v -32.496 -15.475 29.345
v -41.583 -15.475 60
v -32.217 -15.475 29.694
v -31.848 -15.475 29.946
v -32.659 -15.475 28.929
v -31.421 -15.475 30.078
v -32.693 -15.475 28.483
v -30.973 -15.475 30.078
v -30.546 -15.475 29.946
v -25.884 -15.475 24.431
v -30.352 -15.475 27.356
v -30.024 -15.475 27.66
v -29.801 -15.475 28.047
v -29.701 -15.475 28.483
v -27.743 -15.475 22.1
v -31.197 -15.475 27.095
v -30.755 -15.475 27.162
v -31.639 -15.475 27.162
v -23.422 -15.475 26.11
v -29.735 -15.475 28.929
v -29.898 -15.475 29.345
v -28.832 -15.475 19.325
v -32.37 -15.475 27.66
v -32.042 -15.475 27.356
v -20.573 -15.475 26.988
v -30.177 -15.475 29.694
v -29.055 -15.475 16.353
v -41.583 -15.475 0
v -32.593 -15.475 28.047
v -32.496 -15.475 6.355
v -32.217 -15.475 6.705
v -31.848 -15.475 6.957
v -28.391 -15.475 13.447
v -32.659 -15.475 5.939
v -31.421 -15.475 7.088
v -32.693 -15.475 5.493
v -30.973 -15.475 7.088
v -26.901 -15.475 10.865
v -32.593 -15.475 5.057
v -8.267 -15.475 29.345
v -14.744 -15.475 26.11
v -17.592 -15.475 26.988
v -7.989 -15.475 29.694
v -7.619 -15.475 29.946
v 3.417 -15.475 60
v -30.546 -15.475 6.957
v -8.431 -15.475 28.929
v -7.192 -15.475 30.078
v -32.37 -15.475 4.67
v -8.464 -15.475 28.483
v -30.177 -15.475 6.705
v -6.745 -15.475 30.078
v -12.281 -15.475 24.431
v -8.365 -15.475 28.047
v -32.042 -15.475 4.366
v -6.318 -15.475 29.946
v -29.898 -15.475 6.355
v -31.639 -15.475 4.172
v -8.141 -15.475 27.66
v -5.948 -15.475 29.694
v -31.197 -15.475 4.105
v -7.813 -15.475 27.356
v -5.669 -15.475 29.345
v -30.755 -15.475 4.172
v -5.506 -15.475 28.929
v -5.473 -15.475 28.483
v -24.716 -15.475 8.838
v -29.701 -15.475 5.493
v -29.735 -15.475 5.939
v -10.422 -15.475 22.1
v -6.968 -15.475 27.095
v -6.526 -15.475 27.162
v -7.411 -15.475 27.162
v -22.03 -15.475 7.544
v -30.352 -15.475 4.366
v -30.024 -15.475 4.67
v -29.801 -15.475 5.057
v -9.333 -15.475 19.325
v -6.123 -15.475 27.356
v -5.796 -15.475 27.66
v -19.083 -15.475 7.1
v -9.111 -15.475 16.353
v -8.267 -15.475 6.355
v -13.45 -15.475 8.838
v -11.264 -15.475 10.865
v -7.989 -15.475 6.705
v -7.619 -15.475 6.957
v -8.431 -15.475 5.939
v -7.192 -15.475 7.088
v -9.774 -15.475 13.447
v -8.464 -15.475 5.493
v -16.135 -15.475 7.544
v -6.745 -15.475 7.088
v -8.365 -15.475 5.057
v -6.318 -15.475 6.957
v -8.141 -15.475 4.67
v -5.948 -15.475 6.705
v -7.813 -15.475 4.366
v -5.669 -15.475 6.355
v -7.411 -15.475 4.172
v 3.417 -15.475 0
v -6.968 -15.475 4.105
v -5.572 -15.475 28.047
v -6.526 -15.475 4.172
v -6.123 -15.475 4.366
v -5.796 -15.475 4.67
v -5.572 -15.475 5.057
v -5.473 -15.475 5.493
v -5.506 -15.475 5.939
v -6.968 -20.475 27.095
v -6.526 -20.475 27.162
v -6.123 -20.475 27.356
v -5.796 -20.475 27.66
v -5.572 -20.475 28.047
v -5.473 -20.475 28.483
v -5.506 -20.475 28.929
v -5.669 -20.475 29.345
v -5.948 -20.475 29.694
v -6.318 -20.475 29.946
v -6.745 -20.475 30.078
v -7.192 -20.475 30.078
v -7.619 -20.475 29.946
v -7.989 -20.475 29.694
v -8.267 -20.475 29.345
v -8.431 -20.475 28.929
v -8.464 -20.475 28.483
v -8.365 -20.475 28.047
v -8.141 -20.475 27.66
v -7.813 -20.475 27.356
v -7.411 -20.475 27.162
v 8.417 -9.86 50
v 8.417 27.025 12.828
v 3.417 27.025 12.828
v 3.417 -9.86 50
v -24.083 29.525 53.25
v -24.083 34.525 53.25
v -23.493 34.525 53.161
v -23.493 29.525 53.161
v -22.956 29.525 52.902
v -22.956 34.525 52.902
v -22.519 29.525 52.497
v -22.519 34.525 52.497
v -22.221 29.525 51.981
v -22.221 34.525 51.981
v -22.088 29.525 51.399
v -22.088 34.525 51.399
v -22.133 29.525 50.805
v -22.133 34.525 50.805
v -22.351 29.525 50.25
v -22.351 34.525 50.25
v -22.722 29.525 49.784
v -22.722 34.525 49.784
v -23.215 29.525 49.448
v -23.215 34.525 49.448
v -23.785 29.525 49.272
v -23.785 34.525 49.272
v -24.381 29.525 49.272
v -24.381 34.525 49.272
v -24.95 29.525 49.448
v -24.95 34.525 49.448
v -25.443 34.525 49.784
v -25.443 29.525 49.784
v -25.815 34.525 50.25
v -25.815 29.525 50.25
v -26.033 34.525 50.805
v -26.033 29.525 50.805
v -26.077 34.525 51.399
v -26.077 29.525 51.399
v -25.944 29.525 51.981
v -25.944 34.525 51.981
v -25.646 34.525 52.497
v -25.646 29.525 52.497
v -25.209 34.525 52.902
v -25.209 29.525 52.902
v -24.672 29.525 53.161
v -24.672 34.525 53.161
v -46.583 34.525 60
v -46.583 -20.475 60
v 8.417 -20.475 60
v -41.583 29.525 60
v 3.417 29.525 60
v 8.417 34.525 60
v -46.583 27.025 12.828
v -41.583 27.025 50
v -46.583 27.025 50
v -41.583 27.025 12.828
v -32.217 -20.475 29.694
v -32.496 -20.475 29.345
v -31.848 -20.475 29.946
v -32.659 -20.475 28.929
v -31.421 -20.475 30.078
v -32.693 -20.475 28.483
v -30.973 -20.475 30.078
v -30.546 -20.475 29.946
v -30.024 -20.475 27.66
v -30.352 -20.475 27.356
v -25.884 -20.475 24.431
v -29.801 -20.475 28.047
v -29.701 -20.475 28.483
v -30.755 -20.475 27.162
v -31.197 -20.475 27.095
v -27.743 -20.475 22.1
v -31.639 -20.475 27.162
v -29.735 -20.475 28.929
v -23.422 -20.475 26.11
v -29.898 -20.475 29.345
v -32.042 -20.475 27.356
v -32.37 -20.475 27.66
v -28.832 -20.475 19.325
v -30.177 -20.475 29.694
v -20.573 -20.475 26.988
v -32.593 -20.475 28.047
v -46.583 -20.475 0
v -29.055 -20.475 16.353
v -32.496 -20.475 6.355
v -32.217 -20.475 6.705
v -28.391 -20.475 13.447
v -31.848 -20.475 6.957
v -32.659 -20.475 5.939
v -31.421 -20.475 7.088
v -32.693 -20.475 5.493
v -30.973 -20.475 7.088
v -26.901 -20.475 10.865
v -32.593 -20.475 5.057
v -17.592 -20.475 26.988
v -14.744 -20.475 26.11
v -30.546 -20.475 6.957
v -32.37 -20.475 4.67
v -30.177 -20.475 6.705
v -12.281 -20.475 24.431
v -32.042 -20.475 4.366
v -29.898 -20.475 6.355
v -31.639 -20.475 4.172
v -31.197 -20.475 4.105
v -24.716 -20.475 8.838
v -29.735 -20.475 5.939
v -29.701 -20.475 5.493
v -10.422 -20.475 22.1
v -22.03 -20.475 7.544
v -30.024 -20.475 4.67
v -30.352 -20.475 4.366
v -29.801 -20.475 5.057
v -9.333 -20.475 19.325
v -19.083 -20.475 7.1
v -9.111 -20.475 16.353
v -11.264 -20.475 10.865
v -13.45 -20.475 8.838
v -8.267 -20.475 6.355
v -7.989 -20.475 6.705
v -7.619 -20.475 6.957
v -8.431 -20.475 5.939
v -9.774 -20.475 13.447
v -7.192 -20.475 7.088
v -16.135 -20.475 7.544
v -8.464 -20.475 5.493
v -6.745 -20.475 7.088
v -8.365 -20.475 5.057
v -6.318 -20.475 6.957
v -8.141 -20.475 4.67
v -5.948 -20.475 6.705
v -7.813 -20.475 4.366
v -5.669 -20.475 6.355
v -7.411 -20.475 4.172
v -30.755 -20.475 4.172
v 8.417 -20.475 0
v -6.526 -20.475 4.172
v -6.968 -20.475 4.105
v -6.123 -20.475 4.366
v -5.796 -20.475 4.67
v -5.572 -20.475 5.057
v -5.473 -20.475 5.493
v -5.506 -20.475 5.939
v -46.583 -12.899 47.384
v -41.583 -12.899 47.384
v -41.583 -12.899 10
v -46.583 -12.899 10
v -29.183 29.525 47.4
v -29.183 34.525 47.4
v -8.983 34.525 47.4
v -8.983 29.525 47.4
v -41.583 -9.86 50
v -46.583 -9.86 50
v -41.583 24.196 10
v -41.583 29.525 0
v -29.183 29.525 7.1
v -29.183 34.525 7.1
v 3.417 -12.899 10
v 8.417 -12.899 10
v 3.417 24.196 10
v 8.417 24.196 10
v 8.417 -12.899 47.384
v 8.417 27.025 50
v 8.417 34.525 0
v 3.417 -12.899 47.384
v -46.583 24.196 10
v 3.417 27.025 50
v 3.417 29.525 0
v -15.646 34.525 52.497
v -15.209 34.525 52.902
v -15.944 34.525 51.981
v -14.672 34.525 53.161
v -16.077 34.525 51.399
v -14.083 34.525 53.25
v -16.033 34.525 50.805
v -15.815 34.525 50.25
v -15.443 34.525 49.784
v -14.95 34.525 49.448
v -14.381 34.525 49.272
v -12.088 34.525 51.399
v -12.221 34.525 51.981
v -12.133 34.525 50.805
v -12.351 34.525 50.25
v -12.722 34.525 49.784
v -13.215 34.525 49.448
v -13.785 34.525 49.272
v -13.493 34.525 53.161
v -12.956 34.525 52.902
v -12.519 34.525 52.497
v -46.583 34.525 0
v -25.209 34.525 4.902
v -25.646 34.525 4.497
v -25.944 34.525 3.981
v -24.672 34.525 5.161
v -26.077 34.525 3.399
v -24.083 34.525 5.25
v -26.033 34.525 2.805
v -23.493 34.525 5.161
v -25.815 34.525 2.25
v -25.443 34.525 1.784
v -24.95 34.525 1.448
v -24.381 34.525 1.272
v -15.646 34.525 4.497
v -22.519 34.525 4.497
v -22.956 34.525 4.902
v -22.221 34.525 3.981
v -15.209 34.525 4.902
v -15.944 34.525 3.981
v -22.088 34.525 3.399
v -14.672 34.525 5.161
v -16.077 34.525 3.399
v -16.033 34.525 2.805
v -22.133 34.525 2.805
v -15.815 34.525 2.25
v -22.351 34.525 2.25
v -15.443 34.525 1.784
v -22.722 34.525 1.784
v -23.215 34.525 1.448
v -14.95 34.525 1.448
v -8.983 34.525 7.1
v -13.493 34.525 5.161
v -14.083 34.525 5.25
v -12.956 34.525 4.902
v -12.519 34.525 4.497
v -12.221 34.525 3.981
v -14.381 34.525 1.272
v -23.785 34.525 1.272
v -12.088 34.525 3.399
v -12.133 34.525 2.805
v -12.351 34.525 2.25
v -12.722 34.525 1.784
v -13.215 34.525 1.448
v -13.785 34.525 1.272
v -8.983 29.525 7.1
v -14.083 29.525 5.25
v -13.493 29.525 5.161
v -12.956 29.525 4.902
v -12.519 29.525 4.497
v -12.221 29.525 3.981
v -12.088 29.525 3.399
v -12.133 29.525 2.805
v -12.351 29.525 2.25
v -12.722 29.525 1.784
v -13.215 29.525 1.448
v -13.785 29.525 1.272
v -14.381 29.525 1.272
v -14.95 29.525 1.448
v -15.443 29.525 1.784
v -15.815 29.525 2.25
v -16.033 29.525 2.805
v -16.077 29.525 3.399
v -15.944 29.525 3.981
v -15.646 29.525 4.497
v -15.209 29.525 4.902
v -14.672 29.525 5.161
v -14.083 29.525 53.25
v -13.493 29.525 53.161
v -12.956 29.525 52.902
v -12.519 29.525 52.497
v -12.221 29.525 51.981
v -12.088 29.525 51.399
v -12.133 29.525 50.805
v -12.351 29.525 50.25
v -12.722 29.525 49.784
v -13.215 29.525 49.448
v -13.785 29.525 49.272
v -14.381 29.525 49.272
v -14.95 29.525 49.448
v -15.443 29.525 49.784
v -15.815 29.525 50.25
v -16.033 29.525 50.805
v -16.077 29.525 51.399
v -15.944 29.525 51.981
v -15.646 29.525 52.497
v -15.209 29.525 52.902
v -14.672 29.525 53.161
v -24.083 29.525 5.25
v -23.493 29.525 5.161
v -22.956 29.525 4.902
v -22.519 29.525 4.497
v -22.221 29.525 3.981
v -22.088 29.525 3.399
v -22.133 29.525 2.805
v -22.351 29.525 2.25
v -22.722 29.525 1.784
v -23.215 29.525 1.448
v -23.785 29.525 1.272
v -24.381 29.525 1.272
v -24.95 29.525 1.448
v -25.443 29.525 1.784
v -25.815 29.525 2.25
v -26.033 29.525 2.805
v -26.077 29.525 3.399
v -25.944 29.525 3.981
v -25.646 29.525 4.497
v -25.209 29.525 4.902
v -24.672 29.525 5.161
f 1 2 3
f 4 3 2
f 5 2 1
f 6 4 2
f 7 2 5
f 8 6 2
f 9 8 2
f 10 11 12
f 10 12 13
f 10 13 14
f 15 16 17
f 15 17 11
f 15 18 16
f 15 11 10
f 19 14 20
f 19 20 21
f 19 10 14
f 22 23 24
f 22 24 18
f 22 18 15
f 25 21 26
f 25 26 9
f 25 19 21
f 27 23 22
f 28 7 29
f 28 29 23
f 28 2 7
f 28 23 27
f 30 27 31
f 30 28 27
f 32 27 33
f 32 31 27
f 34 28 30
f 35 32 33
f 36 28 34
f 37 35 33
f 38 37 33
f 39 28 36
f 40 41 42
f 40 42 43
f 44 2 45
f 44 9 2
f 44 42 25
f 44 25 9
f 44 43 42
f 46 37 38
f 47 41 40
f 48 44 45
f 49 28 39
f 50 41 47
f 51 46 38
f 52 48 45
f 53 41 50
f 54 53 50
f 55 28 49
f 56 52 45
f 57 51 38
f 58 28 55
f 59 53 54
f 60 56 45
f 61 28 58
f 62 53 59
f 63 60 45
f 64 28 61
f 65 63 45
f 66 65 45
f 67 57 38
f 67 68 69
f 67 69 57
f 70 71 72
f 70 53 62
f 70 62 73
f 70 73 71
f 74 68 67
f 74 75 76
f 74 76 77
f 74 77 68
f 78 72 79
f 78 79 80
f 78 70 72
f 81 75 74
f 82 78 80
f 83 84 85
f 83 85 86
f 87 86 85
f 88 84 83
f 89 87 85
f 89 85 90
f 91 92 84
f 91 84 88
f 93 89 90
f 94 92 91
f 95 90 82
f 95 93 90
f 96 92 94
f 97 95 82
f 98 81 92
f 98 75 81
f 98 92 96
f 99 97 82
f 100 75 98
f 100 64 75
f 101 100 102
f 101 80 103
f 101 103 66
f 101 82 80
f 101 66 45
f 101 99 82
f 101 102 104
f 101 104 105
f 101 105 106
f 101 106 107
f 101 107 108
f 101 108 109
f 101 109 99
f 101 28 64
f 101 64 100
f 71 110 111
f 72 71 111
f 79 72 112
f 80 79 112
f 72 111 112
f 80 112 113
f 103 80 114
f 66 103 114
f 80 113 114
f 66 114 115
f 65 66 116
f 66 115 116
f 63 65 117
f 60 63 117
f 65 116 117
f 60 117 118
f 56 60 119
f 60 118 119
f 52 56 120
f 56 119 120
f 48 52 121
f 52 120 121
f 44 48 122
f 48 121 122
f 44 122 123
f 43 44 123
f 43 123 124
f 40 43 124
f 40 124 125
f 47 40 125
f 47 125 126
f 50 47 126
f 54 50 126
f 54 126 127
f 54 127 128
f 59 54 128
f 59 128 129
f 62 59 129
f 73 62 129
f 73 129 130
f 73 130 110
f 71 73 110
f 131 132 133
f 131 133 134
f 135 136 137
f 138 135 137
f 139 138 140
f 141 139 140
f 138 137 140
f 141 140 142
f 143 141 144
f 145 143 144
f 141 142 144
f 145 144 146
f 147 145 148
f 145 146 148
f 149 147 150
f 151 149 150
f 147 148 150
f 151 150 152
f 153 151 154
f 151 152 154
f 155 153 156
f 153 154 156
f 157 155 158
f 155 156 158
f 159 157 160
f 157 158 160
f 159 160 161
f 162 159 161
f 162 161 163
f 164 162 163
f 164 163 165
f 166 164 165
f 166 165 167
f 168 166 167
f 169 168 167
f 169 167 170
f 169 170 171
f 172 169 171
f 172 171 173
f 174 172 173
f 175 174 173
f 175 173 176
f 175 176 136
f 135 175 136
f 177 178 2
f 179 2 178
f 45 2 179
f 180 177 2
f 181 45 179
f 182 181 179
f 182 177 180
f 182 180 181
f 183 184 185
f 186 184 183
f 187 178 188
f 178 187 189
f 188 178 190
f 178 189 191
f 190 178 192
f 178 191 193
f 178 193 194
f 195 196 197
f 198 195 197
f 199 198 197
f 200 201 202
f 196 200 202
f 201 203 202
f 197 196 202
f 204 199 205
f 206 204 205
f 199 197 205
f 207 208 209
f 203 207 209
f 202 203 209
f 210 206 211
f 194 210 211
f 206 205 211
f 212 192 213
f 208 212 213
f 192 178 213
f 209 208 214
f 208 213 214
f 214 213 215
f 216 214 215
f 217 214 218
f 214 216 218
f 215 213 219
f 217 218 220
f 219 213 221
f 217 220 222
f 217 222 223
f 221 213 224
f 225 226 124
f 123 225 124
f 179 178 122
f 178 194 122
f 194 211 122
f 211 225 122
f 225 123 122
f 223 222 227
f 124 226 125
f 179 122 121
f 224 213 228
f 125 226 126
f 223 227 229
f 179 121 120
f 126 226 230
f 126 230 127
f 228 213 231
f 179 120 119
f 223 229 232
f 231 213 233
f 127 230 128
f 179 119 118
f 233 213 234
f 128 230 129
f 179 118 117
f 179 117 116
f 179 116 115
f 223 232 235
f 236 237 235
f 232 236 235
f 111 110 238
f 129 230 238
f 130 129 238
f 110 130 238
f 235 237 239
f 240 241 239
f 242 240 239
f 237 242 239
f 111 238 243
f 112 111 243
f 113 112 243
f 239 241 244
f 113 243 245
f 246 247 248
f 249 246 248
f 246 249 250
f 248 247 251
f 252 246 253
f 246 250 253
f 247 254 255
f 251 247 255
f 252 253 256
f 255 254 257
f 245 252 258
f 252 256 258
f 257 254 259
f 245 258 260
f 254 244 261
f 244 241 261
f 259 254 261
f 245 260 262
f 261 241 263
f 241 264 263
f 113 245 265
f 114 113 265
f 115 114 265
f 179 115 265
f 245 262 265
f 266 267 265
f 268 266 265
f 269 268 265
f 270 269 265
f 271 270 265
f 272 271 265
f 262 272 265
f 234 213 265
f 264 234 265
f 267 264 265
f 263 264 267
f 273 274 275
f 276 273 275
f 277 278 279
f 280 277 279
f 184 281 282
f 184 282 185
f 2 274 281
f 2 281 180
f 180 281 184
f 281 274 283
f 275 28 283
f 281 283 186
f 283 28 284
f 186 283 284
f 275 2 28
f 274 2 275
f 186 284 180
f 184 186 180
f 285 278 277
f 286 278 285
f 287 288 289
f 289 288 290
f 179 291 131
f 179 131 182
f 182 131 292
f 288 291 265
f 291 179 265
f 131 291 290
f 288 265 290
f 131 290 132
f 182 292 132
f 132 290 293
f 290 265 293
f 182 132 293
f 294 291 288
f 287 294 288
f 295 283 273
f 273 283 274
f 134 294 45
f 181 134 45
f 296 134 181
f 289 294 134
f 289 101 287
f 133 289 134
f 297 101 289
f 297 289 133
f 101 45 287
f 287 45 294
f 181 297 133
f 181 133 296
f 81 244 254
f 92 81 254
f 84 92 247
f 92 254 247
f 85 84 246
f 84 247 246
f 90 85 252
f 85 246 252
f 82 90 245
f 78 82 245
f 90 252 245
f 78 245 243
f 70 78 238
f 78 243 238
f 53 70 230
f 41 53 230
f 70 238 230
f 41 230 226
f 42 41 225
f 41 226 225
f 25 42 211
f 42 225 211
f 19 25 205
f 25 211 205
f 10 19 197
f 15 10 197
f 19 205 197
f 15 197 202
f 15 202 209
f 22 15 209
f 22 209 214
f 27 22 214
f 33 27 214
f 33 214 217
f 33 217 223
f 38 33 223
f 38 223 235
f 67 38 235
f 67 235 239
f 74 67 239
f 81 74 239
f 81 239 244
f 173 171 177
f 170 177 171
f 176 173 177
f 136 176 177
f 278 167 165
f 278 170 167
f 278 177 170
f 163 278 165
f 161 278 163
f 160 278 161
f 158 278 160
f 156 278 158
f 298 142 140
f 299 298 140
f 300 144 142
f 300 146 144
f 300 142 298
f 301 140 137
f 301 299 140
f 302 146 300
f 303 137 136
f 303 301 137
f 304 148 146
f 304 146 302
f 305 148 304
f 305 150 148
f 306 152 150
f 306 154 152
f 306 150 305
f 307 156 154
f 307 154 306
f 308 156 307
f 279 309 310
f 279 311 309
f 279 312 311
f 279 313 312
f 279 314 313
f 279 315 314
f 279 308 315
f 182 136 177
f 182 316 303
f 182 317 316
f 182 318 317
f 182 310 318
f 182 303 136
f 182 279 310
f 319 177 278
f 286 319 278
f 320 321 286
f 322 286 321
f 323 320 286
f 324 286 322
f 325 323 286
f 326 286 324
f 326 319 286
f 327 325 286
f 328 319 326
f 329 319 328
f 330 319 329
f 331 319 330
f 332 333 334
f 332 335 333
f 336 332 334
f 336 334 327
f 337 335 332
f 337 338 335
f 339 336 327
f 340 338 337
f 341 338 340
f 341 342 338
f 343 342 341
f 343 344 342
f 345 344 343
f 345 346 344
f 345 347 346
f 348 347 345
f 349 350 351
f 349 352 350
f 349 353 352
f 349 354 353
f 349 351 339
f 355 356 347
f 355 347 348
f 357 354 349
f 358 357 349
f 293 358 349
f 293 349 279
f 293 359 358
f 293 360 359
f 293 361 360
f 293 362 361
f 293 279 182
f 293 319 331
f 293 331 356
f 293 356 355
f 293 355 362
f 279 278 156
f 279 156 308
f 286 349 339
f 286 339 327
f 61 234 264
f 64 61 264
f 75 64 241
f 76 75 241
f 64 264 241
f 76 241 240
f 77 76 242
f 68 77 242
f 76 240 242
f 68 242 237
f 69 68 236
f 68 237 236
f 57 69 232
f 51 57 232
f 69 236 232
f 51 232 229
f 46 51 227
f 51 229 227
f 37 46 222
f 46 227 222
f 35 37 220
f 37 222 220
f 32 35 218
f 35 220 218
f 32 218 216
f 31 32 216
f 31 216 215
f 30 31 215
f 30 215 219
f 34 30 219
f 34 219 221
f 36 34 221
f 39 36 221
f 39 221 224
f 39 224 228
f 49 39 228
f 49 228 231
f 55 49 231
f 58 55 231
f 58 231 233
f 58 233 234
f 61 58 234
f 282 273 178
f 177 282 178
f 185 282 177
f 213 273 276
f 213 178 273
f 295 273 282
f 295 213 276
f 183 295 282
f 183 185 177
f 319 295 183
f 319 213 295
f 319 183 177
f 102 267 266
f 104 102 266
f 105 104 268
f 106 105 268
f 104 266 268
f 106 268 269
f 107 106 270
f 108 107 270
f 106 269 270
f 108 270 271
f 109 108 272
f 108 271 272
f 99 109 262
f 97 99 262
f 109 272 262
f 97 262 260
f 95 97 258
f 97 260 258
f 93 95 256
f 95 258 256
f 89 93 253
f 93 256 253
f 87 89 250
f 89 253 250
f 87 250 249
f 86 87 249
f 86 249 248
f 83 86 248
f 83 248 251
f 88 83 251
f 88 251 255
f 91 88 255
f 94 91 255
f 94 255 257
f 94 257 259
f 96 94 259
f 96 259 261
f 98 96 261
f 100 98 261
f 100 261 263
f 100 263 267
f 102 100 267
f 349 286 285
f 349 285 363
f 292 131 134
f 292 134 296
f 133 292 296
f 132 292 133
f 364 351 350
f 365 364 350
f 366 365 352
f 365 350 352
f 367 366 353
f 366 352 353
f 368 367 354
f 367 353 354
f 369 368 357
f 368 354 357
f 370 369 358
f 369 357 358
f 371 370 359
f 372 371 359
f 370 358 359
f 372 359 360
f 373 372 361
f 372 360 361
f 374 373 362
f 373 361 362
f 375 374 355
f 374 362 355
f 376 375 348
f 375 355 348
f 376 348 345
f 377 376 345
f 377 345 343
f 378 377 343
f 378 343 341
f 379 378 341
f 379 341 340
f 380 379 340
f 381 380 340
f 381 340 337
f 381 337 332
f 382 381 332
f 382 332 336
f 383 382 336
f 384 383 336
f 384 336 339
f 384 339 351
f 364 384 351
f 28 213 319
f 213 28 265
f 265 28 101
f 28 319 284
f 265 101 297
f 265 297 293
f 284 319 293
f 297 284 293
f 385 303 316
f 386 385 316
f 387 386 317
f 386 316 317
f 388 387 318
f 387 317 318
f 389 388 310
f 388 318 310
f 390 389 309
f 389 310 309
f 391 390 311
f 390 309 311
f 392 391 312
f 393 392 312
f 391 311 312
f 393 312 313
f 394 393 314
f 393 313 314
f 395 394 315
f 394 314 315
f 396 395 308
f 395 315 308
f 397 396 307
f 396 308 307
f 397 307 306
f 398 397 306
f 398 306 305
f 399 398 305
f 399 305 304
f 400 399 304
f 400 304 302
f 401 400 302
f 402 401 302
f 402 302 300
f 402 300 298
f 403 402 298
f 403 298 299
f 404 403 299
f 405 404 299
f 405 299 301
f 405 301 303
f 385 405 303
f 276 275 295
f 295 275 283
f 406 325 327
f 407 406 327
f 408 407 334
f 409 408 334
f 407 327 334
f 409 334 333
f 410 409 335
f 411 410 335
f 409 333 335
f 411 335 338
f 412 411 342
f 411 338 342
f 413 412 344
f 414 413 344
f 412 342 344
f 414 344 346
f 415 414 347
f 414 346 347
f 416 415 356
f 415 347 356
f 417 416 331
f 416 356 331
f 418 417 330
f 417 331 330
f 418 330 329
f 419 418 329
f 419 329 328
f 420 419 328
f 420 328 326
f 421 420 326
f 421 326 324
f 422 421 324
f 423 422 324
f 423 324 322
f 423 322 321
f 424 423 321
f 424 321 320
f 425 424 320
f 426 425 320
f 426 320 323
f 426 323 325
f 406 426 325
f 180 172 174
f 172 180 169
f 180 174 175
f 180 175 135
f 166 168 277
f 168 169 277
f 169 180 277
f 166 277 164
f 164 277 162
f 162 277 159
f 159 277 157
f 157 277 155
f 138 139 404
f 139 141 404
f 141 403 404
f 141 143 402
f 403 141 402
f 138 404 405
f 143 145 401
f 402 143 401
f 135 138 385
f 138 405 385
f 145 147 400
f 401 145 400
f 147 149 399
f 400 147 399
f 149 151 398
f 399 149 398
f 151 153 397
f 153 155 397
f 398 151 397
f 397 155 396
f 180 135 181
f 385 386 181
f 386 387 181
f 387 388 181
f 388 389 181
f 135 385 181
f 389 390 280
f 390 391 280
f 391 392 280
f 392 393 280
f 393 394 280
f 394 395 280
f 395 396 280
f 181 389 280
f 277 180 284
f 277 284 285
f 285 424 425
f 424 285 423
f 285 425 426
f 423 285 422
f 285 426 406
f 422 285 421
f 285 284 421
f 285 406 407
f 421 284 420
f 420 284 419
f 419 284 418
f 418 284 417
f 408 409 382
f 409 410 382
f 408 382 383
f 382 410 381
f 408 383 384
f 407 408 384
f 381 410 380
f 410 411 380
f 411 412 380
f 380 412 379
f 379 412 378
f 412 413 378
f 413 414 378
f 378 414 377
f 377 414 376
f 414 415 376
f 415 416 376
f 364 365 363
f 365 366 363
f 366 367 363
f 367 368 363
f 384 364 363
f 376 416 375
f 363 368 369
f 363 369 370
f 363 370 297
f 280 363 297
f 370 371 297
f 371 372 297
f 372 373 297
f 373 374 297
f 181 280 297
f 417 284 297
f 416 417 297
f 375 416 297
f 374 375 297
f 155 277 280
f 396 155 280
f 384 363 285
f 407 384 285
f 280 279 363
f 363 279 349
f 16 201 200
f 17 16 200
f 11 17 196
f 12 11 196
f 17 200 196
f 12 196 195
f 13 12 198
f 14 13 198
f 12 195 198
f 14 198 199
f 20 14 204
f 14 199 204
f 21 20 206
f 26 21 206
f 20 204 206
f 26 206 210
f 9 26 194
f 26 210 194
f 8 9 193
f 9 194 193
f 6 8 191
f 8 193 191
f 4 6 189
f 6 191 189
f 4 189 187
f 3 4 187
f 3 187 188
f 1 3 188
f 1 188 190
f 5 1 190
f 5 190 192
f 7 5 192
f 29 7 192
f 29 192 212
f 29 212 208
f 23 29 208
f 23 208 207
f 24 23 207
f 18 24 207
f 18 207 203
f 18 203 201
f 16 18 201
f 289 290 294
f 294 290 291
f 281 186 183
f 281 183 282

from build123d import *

# Parameters (mm, degrees)
ESQUISSE1_W             = 55
ESQUISSE1_H             = 55
ESQUISSE1_W_2           = 45
ESQUISSE1_H_2           = 45
BOSS_EXTRU_1_DEPTH      = 60
ESQUISSE2_R             = 2
ESQUISSE2_W             = 20.2
ESQUISSE2_H             = 40.3
ENL_V_MAT_EXTRU_1_DEPTH = 10
ESQUISSE5_R             = 10
ESQUISSE5_R_2           = 1.5
ENL_V_MAT_EXTRU_2_DEPTH = 10
ENL_V_MAT_EXTRU_3_DEPTH = 89.413584698


with BuildPart() as part:
    # Esquisse1 → Boss.-Extru.1 (new body)
    with BuildSketch(Plane.XY):
        with Locations((-19.082718041, 7.024802088)):
            Rectangle(ESQUISSE1_W, ESQUISSE1_H)
        with Locations((-19.082718041, 7.024802088)):
            Rectangle(ESQUISSE1_W_2, ESQUISSE1_H_2, mode=Mode.SUBTRACT)
    extrude(amount=BOSS_EXTRU_1_DEPTH)

    # Esquisse2 → Enlèv. mat.-Extru.1 (cut)
    with BuildSketch(Plane(origin=(0, 34.524802088, 0), x_dir=(1, 0, 0), z_dir=(0, 1, 0))):
        with Locations(Location((-24.082718041, -3.25, 0), (0, 0, 270))):
            Circle(ESQUISSE2_R)
        with Locations(Location((-14.082718041, -3.25, 0), (0, 0, 270))):
            Circle(ESQUISSE2_R)
        with Locations(Location((-24.082718041, -51.25, 0), (0, 0, 270))):
            Circle(ESQUISSE2_R)
        with Locations(Location((-14.082718041, -51.25, 0), (0, 0, 270))):
            Circle(ESQUISSE2_R)
        with Locations((-19.082718041, -27.25)):
            Rectangle(ESQUISSE2_W, ESQUISSE2_H)
    extrude(amount=-ENL_V_MAT_EXTRU_1_DEPTH, mode=Mode.SUBTRACT)

    # Esquisse5 → Enlèv. mat.-Extru.2 (cut)
    with BuildSketch(Plane.XZ.offset(20.475197912)):
        with Locations(Location((-19.082718041, 17.1, 0), (0, 0, 270))):
            Circle(ESQUISSE5_R)
        with Locations(Location((-31.197044543, 5.605084019, 0), (0, 0, 270))):
            Circle(ESQUISSE5_R_2)
        with Locations(Location((-6.968391539, 5.605084019, 0), (0, 0, 270))):
            Circle(ESQUISSE5_R_2)
        with Locations(Location((-31.197044543, 28.594915981, 0), (0, 0, 270))):
            Circle(ESQUISSE5_R_2)
        with Locations(Location((-6.968391539, 28.594915981, 0), (0, 0, 270))):
            Circle(ESQUISSE5_R_2)
    extrude(amount=-ENL_V_MAT_EXTRU_2_DEPTH, mode=Mode.SUBTRACT)

    # Esquisse8 → Enlèv. mat.-Extru.3 (cut, through all)
    with BuildSketch(Plane(origin=(8.417281959, 0, 0), x_dir=(0, 0, -1), z_dir=(1, 0, 0))):
        Polygon((-50, 27.024802088), (-12.828427125, 27.024802088), (-50, -9.859909005), align=None)
        Polygon((-47.383863207, -12.898988168), (-10, -12.898988168), (-10, 24.196374963), align=None)
    extrude(amount=-ENL_V_MAT_EXTRU_3_DEPTH, mode=Mode.SUBTRACT)


solid = part.part
